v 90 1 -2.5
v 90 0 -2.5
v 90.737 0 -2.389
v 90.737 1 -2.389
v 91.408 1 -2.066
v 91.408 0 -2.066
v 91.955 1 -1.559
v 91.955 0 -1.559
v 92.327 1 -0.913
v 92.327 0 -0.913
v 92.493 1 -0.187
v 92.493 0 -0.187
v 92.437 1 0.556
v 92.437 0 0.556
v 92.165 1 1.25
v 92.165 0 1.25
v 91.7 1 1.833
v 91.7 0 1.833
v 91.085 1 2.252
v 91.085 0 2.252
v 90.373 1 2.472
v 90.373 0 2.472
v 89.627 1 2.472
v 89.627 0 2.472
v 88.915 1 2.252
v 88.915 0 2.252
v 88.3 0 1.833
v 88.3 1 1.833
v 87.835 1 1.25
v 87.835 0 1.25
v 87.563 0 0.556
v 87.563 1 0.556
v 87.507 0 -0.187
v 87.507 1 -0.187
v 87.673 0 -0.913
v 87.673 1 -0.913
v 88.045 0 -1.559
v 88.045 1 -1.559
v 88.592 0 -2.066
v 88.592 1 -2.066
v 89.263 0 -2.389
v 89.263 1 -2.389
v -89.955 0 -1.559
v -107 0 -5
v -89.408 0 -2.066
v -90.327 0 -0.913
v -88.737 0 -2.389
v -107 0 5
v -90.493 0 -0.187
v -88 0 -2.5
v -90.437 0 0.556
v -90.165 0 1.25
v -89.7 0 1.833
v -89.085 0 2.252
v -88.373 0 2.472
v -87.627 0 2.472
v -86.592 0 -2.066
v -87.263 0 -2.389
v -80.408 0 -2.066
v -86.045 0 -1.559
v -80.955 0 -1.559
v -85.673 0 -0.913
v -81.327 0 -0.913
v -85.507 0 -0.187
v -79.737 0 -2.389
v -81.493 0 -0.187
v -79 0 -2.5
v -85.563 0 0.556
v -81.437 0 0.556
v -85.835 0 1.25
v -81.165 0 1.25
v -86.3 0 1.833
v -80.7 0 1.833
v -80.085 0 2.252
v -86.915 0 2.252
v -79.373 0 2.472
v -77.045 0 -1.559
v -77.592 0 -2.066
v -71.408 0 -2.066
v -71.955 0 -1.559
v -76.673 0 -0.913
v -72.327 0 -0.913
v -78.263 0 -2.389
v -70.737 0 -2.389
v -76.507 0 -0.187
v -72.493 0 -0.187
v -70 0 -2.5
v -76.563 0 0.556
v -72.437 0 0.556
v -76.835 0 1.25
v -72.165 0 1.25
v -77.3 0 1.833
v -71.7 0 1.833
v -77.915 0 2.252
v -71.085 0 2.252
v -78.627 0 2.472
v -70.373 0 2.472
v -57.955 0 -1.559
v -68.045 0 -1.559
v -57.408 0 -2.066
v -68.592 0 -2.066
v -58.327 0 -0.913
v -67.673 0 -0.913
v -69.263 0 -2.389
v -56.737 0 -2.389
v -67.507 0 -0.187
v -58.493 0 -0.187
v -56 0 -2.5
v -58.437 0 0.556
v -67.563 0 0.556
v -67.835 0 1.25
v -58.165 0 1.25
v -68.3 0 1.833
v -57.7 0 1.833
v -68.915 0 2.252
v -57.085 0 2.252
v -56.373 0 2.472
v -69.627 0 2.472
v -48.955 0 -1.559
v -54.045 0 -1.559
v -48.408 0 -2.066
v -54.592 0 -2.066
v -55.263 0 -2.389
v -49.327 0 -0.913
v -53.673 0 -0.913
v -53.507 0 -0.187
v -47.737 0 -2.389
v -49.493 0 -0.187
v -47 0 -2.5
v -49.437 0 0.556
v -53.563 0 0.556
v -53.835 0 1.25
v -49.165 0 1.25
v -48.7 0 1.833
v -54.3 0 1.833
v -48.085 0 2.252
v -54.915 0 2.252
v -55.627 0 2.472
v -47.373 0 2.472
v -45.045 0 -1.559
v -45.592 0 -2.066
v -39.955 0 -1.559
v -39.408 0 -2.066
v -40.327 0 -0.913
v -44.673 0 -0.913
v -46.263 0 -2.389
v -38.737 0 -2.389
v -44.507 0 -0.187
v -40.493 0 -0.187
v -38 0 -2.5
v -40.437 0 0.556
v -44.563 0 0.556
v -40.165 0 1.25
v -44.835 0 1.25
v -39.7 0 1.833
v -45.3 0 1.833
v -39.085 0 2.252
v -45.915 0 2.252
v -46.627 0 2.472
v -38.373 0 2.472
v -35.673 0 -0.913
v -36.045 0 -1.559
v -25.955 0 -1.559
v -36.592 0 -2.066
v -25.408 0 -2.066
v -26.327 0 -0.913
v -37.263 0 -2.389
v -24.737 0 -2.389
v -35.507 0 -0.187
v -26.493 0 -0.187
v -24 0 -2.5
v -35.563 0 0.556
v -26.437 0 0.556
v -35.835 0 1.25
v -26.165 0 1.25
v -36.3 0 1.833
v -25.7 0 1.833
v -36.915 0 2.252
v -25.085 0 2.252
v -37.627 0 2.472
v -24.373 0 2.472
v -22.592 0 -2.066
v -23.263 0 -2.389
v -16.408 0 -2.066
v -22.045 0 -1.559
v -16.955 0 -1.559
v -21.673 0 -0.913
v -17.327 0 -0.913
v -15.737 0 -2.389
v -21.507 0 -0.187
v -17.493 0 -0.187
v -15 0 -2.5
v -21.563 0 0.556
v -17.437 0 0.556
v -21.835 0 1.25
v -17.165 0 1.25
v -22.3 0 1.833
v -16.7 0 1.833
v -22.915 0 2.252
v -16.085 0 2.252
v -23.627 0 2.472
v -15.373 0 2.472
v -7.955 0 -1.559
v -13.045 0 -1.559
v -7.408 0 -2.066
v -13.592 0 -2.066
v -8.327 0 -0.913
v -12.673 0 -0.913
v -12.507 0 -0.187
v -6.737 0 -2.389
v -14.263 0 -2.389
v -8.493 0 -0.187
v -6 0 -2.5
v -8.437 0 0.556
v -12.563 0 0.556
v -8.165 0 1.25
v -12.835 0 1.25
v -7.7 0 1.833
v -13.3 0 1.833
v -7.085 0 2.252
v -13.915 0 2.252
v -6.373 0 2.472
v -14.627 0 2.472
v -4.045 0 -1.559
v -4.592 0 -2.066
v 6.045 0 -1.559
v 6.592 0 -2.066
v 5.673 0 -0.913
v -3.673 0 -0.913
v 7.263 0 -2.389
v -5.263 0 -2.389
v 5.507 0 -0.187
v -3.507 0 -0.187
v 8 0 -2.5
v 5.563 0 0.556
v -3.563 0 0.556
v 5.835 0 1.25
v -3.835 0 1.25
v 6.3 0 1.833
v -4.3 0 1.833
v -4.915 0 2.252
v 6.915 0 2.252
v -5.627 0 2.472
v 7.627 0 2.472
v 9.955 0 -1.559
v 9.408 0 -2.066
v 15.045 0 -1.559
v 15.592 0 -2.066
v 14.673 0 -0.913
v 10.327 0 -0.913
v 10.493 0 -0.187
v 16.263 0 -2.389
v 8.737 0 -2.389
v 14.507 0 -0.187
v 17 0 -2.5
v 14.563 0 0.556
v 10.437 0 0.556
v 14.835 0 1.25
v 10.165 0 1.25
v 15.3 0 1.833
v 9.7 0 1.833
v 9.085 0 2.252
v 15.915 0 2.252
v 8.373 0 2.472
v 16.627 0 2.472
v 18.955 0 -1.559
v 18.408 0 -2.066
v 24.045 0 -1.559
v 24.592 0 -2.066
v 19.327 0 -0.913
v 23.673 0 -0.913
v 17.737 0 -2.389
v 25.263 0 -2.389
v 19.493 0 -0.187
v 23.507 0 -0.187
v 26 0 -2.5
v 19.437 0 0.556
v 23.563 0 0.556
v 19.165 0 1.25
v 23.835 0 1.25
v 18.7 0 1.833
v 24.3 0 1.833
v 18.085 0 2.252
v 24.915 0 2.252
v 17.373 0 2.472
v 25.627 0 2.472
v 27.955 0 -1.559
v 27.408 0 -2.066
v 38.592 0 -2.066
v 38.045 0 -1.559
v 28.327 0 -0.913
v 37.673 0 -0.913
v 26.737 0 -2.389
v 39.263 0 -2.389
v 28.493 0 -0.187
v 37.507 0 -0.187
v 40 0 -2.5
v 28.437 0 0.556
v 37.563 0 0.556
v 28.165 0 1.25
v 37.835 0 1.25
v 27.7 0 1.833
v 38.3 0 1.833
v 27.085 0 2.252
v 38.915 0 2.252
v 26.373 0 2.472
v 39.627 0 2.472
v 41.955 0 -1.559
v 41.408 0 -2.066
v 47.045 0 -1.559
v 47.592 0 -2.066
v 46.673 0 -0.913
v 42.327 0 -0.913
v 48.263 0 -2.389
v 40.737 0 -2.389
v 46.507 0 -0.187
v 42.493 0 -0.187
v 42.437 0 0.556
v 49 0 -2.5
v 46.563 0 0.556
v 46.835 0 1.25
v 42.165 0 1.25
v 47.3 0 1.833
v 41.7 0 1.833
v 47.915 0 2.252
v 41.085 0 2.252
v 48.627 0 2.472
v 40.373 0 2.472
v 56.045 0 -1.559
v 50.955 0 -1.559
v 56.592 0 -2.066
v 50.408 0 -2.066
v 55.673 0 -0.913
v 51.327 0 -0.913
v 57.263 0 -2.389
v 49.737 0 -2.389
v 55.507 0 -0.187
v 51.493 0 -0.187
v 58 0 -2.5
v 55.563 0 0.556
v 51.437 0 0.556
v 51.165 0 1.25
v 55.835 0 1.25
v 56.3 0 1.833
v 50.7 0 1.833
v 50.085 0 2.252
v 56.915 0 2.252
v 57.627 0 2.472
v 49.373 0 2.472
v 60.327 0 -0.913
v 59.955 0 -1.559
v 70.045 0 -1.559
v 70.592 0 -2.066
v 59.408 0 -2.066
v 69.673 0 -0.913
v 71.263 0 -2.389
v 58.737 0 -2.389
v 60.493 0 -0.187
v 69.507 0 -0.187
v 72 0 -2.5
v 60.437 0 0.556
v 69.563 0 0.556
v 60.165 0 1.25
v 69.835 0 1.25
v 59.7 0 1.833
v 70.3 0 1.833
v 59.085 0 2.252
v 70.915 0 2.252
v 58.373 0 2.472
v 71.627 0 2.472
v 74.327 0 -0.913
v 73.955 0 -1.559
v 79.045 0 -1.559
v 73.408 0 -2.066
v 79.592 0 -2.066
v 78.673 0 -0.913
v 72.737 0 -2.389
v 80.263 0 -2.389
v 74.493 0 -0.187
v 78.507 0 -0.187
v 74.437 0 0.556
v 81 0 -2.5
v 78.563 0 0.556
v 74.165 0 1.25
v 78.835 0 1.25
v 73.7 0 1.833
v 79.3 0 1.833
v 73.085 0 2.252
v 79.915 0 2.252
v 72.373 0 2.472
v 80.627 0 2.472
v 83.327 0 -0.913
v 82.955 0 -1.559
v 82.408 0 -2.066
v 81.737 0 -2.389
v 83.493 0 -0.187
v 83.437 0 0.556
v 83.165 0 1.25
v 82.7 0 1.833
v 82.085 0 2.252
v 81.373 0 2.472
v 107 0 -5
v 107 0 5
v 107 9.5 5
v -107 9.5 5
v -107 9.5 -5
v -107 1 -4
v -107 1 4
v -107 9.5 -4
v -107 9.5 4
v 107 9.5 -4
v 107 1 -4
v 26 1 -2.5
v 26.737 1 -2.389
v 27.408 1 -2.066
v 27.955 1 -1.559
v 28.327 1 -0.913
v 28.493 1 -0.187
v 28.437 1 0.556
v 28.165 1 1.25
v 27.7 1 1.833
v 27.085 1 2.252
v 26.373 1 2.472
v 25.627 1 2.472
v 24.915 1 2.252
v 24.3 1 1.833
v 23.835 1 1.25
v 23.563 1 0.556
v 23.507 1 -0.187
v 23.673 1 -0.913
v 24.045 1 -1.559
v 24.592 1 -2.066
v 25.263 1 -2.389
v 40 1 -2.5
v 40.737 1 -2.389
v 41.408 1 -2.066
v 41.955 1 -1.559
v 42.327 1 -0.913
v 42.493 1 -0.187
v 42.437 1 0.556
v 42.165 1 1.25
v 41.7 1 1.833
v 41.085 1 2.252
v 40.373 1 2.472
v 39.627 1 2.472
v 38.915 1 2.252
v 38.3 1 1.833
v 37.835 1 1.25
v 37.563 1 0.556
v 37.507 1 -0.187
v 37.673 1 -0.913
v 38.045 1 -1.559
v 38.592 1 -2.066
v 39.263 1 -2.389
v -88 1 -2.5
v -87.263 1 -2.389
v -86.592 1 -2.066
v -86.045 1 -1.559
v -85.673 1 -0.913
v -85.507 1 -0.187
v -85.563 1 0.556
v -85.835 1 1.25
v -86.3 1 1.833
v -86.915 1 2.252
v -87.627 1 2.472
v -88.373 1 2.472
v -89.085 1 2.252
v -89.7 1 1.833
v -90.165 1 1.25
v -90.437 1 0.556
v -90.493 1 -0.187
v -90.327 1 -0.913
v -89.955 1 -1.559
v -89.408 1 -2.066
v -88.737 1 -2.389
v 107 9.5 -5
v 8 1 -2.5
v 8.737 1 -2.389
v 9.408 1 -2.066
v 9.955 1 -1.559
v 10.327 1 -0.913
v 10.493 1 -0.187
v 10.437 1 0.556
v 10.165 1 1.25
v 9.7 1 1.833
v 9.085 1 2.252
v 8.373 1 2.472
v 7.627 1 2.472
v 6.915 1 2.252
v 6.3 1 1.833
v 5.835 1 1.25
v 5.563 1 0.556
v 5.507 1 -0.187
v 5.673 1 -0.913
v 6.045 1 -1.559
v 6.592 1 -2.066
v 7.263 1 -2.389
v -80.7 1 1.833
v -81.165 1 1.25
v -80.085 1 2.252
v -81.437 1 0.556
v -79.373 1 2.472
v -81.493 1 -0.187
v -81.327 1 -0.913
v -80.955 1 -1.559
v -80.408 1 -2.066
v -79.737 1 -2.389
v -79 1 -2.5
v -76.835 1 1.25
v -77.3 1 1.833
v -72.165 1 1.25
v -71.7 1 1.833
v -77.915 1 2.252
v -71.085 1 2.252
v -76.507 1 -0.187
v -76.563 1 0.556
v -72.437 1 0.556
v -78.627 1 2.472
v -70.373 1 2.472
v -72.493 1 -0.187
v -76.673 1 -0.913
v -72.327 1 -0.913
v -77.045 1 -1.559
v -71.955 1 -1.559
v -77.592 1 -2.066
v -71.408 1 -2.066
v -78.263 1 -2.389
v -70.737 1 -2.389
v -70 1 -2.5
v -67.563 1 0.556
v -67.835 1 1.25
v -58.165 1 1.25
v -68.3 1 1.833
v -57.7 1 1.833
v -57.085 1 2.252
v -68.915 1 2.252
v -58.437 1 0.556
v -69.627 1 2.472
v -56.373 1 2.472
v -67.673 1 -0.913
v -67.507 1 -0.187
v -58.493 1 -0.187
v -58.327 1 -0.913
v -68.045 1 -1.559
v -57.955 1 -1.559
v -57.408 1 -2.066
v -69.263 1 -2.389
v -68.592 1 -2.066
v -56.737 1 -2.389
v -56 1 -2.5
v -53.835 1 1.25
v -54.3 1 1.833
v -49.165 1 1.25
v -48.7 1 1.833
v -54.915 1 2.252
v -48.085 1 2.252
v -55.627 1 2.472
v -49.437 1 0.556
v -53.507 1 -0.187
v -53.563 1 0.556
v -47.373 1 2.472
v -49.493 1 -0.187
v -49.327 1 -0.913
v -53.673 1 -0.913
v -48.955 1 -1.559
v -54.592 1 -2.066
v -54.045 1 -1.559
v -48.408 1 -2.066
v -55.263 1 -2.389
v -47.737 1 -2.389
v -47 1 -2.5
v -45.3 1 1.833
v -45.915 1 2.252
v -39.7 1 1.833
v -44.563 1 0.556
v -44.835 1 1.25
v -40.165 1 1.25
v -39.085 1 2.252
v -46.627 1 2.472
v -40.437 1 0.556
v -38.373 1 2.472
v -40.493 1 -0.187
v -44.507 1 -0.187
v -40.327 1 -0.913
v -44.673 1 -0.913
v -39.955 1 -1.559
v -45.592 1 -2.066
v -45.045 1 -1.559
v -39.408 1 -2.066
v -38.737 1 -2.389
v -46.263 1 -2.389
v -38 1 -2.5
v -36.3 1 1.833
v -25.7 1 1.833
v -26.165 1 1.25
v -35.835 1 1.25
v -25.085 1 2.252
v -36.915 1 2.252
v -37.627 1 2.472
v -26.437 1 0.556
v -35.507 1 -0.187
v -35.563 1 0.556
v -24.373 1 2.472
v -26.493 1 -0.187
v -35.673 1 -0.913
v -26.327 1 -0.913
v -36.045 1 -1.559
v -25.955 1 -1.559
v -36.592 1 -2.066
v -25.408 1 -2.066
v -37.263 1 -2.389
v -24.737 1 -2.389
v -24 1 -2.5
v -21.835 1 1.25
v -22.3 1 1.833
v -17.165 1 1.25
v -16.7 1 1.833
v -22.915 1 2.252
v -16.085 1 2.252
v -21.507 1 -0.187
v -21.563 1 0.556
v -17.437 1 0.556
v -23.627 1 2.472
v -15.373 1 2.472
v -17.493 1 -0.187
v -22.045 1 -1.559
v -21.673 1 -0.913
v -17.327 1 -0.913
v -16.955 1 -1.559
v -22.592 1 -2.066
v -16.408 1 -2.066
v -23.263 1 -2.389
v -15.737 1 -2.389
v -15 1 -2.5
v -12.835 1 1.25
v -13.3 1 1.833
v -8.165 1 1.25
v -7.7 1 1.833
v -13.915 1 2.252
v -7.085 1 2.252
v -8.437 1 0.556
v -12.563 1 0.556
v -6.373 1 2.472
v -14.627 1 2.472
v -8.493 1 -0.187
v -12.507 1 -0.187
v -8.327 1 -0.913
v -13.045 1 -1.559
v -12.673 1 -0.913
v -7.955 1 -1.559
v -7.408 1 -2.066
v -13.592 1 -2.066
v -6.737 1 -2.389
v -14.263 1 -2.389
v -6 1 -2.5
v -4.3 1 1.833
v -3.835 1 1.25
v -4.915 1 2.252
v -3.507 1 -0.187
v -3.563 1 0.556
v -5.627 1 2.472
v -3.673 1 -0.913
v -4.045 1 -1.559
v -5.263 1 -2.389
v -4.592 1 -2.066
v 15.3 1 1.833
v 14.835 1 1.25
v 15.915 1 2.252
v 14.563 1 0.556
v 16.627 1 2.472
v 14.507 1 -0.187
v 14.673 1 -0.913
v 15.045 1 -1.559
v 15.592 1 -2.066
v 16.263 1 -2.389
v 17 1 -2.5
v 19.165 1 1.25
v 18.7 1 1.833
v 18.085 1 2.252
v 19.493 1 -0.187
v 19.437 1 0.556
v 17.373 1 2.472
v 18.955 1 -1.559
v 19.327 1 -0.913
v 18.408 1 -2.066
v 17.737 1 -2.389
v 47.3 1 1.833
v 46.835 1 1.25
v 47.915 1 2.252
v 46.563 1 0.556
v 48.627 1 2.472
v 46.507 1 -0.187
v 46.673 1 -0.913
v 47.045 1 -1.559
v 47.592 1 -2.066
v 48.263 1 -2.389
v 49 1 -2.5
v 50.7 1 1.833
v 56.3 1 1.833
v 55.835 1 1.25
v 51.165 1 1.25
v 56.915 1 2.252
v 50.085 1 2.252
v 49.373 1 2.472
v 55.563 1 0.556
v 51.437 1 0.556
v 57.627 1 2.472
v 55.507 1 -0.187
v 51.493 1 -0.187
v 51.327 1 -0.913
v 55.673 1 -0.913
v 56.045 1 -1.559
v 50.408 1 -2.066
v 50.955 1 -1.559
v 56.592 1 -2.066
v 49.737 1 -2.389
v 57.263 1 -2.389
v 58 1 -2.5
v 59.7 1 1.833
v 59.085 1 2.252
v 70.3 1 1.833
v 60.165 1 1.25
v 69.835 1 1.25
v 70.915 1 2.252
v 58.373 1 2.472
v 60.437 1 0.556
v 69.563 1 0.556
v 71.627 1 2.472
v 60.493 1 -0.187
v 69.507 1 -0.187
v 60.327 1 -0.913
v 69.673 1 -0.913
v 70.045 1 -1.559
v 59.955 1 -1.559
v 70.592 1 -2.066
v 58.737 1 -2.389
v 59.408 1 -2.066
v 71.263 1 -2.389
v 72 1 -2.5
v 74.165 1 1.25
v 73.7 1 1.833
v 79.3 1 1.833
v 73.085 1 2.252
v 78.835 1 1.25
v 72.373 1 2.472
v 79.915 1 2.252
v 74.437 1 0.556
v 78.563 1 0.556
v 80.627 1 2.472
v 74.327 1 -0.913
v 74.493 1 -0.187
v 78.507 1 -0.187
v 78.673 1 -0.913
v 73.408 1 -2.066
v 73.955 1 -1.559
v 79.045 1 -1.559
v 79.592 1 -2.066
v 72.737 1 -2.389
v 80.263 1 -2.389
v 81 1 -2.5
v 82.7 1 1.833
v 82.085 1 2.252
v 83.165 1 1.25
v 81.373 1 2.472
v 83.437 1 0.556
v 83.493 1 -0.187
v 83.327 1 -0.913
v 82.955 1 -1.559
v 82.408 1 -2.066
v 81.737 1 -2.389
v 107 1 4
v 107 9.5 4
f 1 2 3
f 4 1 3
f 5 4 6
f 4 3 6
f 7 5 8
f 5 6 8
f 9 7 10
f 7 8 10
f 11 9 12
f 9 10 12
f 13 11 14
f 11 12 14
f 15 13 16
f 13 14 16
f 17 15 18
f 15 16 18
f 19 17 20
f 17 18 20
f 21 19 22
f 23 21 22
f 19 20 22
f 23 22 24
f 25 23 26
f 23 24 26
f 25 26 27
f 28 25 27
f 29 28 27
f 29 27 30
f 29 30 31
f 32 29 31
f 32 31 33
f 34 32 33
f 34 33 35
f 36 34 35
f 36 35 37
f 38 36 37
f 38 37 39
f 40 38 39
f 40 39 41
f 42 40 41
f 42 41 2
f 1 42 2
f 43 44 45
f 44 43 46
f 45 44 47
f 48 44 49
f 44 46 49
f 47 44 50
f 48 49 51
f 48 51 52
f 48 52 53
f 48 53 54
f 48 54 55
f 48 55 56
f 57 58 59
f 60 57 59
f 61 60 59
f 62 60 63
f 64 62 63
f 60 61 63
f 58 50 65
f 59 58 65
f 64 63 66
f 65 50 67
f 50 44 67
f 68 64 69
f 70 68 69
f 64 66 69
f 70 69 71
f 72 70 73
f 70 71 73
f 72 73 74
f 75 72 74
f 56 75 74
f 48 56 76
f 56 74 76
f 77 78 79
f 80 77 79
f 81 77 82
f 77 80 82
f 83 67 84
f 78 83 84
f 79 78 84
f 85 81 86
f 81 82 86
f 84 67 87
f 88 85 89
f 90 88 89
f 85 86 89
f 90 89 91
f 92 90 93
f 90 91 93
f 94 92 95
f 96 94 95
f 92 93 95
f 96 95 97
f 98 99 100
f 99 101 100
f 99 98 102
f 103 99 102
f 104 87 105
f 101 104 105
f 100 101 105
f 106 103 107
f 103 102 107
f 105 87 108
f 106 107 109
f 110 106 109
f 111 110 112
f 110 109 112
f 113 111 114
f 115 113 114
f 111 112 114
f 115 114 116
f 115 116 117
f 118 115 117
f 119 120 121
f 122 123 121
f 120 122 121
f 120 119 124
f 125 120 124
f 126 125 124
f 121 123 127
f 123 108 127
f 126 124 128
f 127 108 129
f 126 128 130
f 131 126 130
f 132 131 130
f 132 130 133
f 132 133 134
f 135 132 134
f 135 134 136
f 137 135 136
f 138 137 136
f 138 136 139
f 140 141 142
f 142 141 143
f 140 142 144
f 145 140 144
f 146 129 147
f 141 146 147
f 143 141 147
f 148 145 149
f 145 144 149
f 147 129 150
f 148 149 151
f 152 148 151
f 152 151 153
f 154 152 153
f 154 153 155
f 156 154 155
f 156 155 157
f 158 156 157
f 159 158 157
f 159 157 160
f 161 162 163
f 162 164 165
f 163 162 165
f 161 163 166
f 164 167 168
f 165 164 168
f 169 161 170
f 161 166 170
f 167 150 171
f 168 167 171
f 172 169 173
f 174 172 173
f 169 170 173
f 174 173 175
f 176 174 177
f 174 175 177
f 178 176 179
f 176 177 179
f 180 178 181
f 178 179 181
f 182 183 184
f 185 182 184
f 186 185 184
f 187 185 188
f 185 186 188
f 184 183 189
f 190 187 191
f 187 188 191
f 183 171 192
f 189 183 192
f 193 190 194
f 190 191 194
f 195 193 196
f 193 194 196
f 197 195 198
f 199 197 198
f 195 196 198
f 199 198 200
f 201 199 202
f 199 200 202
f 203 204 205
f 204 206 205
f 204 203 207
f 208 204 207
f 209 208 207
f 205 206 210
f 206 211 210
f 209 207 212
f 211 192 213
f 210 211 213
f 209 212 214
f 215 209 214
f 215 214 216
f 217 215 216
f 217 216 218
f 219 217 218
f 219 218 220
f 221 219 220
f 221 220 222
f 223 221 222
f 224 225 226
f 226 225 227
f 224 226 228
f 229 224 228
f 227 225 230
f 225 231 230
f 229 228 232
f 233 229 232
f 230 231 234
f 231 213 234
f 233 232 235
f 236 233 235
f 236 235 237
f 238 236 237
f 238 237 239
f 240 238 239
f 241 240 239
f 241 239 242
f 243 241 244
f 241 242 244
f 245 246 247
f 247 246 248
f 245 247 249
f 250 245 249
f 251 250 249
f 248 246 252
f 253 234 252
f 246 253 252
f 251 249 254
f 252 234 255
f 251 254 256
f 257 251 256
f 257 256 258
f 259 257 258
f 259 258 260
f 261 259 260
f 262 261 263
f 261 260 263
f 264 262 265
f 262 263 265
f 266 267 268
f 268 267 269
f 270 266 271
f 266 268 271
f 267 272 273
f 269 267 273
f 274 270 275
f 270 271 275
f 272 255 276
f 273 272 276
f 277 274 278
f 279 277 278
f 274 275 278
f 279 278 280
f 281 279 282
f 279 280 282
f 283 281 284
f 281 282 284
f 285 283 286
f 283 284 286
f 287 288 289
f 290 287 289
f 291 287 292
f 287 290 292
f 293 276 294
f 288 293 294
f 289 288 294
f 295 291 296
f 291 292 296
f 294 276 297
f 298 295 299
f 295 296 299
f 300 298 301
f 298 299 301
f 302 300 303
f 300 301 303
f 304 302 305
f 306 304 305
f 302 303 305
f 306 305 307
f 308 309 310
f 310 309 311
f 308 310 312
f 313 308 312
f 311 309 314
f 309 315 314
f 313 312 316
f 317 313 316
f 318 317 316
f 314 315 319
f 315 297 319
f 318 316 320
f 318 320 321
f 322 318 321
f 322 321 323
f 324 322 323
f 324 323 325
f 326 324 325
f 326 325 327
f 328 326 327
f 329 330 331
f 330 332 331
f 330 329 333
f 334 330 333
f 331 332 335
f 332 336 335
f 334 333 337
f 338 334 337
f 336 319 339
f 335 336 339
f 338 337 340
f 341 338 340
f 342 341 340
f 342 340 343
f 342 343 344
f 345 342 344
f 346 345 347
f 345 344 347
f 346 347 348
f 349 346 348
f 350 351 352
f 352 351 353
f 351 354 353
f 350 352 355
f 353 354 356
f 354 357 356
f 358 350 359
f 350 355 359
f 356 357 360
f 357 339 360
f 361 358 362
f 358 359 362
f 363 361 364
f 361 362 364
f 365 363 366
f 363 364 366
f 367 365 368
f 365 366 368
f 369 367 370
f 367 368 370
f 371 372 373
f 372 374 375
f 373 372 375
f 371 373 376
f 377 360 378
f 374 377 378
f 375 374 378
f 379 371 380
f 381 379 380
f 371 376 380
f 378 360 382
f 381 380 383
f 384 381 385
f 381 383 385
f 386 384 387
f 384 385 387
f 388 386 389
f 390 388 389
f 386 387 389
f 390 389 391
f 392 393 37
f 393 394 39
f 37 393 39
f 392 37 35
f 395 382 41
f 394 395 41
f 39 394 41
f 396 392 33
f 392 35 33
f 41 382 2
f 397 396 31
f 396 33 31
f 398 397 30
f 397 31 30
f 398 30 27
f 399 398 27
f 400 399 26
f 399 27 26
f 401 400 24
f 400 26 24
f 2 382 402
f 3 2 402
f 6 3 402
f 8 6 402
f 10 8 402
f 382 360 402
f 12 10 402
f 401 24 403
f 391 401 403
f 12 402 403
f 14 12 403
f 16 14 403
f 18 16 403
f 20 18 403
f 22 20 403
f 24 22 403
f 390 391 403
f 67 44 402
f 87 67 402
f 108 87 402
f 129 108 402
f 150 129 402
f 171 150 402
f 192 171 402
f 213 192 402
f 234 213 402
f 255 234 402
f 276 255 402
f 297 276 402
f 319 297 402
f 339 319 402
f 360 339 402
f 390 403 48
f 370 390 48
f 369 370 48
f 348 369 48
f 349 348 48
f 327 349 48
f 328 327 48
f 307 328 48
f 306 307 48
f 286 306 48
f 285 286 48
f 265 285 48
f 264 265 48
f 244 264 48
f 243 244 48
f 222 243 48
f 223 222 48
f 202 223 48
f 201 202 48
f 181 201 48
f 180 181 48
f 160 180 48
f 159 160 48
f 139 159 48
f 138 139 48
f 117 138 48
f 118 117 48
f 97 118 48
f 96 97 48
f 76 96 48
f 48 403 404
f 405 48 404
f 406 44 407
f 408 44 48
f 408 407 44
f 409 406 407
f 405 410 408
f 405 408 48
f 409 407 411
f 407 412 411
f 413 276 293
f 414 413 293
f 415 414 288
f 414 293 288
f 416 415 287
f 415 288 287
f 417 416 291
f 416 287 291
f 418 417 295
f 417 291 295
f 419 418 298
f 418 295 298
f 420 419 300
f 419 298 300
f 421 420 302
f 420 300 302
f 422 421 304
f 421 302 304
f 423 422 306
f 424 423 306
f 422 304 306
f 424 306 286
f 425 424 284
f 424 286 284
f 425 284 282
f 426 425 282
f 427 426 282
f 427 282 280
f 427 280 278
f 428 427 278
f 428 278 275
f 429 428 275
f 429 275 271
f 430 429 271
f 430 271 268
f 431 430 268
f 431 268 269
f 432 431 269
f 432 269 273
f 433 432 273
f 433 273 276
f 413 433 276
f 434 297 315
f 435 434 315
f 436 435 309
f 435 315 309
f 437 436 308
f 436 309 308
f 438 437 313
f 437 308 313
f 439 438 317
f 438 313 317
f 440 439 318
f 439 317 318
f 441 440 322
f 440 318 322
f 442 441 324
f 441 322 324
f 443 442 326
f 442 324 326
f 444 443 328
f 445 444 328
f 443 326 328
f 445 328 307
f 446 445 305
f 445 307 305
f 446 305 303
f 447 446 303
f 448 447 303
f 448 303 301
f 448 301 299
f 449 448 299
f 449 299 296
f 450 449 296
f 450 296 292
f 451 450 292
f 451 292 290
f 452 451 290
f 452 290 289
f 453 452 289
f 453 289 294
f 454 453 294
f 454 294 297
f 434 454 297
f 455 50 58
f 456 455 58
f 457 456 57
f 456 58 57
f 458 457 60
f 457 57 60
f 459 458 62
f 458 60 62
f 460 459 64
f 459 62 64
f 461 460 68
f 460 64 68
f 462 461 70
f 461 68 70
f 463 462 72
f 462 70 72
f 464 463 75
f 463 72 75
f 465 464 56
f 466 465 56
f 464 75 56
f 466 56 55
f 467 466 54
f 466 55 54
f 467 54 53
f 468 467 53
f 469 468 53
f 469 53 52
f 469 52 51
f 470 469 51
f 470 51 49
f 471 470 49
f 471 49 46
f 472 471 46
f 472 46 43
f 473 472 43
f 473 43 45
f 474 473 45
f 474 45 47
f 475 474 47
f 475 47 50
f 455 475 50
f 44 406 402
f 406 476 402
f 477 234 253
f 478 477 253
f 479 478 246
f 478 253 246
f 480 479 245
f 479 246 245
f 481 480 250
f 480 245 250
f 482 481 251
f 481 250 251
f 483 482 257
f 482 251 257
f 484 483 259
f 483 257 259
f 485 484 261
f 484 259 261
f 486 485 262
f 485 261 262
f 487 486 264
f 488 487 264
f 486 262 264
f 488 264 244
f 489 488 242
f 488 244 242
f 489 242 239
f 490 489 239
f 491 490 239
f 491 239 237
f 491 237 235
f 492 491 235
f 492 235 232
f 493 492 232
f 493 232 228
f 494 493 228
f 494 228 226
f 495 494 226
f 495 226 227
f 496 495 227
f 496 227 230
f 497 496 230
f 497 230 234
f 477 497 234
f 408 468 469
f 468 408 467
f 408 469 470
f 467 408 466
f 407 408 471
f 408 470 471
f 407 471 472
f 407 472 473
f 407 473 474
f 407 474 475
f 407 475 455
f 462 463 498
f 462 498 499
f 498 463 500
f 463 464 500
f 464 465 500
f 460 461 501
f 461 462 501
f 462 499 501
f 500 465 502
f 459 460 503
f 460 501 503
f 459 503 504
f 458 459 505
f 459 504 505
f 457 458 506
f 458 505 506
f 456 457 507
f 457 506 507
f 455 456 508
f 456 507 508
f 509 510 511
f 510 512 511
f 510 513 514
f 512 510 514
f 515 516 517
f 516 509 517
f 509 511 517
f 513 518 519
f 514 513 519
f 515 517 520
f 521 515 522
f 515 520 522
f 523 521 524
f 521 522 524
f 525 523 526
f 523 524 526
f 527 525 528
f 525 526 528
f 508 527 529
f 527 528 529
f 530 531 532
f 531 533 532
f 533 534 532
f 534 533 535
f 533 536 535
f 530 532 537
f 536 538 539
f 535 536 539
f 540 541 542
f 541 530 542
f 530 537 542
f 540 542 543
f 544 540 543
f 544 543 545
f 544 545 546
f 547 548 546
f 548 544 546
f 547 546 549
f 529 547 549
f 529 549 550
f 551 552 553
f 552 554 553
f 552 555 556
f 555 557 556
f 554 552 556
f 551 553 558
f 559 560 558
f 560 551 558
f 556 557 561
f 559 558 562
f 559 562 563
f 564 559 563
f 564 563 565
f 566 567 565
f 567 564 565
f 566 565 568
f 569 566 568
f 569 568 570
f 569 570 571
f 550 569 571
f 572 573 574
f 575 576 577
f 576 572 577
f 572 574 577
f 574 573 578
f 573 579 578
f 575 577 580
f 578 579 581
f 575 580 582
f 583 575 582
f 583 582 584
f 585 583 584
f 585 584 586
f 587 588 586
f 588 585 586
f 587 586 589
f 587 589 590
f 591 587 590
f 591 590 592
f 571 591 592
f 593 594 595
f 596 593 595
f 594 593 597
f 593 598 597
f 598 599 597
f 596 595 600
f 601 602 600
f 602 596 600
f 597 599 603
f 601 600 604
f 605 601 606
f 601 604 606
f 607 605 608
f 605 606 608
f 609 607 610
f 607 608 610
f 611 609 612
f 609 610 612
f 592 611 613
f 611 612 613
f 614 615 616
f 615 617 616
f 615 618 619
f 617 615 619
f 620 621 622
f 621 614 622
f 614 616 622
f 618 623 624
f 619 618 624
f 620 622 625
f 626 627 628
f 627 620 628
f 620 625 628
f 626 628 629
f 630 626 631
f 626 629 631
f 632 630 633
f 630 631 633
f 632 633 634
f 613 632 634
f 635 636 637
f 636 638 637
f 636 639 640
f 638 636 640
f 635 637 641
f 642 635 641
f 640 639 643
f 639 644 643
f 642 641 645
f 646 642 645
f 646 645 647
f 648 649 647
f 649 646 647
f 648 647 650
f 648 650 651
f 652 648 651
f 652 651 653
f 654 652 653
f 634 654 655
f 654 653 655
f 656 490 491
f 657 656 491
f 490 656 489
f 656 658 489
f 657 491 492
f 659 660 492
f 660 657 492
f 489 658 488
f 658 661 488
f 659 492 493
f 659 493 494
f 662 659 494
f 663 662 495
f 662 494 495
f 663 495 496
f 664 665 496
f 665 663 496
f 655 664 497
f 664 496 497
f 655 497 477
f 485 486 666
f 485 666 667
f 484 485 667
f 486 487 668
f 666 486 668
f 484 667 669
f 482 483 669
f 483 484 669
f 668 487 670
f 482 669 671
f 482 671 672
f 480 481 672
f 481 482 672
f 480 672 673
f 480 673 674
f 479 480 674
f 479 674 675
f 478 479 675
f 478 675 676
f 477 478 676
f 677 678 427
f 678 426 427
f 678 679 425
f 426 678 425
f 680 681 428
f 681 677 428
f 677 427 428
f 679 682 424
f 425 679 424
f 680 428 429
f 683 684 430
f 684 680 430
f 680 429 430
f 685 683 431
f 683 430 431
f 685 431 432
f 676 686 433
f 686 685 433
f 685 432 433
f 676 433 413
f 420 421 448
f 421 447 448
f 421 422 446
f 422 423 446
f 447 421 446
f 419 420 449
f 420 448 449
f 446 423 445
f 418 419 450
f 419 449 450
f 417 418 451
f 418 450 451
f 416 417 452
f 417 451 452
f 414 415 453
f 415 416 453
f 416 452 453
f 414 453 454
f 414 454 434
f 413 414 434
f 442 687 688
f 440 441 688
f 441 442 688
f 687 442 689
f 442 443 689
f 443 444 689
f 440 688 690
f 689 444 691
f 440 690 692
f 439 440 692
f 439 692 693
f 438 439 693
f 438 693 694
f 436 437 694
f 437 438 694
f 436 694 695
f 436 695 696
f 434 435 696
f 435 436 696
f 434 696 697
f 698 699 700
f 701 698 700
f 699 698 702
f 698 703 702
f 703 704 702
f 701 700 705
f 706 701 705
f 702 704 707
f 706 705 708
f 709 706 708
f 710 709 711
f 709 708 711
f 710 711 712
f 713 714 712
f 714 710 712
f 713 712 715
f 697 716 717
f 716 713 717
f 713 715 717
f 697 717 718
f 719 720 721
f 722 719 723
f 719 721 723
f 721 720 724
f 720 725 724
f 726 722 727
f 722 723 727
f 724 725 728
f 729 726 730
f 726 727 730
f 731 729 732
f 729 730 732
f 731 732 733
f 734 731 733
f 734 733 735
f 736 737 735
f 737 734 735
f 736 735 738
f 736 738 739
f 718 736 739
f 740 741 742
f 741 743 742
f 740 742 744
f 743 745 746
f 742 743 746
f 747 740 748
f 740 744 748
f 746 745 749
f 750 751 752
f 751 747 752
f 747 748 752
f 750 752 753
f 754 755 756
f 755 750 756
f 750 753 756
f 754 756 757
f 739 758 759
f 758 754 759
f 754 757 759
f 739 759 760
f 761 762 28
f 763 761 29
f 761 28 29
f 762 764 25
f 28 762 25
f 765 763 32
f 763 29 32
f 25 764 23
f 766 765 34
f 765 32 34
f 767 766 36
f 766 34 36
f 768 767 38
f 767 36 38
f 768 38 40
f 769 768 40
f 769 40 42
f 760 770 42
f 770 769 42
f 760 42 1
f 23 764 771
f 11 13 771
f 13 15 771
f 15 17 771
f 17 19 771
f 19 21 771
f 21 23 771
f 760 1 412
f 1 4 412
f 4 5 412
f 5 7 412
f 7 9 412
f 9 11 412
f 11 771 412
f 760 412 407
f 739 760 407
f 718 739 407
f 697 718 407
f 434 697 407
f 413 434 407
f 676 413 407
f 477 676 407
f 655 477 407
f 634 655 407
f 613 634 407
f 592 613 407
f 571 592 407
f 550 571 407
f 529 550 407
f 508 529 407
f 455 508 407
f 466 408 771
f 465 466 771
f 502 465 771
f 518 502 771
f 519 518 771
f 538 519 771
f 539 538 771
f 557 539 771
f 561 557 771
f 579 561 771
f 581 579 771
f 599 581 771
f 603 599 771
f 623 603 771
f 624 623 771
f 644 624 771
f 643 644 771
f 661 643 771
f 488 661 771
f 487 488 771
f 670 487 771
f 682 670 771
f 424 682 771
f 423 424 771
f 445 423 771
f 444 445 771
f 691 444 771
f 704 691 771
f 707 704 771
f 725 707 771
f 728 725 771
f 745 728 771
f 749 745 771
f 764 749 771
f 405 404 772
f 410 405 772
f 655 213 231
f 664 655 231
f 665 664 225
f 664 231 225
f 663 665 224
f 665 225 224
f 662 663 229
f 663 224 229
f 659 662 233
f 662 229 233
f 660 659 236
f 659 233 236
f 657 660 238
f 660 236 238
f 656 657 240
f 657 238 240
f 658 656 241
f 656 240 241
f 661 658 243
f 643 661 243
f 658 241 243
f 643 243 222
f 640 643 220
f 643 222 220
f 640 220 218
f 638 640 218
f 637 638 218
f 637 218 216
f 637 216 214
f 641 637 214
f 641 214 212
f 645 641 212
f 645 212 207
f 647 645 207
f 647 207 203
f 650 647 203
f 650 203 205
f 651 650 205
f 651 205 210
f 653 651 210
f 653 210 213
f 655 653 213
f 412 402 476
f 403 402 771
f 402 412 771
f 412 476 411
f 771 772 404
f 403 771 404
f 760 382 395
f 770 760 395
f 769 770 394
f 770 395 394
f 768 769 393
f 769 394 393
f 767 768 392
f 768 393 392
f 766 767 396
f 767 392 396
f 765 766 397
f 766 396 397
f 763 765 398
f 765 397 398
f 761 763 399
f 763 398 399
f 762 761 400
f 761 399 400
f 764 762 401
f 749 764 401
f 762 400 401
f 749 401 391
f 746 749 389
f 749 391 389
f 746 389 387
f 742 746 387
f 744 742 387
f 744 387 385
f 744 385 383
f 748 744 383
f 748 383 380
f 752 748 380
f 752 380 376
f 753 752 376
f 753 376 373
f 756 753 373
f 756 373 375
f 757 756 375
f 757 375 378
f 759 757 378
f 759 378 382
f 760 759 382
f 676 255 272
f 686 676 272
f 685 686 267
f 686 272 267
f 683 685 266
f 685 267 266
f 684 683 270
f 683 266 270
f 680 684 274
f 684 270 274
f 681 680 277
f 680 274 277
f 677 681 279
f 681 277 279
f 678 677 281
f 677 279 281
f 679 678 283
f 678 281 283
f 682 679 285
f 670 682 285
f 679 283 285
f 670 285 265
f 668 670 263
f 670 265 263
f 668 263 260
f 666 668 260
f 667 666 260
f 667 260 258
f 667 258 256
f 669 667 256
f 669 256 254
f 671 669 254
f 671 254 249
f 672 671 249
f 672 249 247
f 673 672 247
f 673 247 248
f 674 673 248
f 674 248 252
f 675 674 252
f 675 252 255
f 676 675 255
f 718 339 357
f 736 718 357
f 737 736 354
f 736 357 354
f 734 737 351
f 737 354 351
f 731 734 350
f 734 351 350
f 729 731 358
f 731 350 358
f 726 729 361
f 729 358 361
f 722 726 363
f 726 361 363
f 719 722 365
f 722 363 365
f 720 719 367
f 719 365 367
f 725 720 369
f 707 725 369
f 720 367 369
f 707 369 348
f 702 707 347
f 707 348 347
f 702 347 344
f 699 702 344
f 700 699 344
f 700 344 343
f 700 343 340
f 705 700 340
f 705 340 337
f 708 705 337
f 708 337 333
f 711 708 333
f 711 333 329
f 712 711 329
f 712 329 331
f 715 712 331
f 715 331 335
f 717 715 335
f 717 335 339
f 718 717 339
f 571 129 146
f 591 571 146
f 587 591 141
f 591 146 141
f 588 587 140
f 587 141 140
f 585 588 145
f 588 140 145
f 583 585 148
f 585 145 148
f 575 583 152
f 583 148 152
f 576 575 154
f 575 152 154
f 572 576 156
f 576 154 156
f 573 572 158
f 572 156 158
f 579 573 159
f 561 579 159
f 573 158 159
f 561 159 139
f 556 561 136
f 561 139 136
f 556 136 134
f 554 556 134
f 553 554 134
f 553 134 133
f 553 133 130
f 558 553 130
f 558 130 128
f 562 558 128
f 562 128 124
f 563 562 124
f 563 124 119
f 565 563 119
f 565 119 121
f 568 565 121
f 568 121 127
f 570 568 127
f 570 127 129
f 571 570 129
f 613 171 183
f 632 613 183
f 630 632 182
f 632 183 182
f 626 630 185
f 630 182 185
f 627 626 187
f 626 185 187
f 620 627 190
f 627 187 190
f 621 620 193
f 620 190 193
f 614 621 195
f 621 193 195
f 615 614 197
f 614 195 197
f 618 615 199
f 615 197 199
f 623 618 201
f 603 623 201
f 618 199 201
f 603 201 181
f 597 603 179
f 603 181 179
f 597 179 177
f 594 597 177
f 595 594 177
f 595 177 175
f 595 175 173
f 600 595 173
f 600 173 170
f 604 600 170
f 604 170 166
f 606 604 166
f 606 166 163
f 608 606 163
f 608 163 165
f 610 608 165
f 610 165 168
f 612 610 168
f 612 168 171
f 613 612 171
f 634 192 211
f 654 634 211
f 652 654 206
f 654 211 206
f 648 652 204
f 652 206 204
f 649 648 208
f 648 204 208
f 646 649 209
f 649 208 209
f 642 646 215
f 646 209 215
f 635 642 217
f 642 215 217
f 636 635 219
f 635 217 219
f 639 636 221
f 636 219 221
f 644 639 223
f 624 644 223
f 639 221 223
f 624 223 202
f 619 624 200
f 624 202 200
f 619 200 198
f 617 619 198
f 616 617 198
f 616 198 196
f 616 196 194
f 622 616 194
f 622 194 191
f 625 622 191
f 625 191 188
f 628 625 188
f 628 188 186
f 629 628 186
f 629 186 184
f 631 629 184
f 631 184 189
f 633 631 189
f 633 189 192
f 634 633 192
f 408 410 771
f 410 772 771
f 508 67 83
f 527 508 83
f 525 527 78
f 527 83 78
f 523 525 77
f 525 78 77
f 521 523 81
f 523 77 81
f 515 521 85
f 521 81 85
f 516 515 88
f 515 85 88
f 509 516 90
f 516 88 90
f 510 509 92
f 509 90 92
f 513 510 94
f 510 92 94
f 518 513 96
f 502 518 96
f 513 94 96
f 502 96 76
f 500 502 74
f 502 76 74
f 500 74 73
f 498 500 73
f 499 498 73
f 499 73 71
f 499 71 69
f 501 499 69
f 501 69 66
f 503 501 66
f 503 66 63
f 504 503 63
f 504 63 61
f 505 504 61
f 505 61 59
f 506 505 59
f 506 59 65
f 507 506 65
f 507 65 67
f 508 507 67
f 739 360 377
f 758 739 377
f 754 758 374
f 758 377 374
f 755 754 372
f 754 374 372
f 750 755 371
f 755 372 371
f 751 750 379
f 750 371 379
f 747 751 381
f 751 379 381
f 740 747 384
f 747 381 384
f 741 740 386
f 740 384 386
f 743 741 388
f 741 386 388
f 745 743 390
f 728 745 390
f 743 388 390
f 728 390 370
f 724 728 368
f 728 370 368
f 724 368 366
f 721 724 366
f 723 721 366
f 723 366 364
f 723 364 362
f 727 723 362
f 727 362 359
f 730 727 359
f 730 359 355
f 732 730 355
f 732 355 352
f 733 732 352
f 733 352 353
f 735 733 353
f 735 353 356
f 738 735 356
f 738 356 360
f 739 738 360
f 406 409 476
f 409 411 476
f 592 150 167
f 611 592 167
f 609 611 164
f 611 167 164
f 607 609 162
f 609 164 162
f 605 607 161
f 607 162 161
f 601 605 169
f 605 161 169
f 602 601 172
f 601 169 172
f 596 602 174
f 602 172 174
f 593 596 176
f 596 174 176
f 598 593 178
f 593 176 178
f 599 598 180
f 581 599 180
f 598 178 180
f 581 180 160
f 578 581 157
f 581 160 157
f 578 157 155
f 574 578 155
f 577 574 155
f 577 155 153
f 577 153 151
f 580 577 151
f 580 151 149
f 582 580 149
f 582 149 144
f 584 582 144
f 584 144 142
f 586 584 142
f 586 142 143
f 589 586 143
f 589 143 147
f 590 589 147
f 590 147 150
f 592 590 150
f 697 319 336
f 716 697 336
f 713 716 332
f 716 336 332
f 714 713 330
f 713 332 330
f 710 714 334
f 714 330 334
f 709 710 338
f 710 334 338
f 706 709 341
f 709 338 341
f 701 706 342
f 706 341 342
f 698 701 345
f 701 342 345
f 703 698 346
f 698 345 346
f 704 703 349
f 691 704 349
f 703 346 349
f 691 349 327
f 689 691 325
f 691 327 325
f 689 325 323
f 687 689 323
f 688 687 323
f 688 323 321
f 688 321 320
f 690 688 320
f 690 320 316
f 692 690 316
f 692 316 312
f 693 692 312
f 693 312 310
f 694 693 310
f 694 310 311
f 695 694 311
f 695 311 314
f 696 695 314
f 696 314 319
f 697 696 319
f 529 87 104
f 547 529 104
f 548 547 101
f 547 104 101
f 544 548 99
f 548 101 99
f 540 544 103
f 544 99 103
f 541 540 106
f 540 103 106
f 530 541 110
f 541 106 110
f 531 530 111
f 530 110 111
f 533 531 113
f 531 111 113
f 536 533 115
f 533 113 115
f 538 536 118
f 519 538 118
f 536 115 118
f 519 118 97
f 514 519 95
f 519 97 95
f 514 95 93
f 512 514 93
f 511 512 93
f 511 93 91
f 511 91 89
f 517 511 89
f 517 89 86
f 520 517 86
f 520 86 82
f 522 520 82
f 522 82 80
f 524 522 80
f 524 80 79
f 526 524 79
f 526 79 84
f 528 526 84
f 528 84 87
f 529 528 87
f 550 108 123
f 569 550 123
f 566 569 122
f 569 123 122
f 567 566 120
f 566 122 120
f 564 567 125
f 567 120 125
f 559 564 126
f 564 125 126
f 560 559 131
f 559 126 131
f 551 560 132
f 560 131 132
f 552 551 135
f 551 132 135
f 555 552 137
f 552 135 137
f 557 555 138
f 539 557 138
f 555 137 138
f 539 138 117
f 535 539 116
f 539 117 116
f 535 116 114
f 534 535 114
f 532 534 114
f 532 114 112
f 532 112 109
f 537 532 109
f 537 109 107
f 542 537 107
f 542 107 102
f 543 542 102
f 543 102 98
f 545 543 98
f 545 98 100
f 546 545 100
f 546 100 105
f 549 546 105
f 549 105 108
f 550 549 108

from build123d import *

# Parameters (mm, degrees)
BOSS_EXTRU_1_DEPTH      = 107
ESQUISSE2_R             = 2.5
ENL_V_MAT_EXTRU_1_DEPTH = 108.537202865


with BuildPart() as part:
    # Esquisse1 → Boss.-Extru.1 (new, symmetric)
    with BuildSketch(Plane(origin=(0, 0, 0), x_dir=(0, 0, -1), z_dir=(1, 0, 0))):
        Polygon((-5, 9.5), (-4, 9.5), (-4, 1), (4, 1), (4, 9.5), (5, 9.5), (5, 0), (-5, 0), align=None)
    extrude(amount=BOSS_EXTRU_1_DEPTH, both=True)

    # Esquisse2 → Enlèv. mat.-Extru.1 (cut, through all)
    with BuildSketch(Plane.XZ):
        with Locations(Location((-88, 0, 0), (0, 0, 270))):
            Circle(ESQUISSE2_R)
        with Locations(Location((-79, 0, 0), (0, 0, 270))):
            Circle(ESQUISSE2_R)
        with Locations(Location((-70, 0, 0), (0, 0, 270))):
            Circle(ESQUISSE2_R)
        with Locations(Location((-56, 0, 0), (0, 0, 270))):
            Circle(ESQUISSE2_R)
        with Locations(Location((-47, 0, 0), (0, 0, 270))):
            Circle(ESQUISSE2_R)
        with Locations(Location((-38, 0, 0), (0, 0, 270))):
            Circle(ESQUISSE2_R)
        with Locations(Location((-24, 0, 0), (0, 0, 270))):
            Circle(ESQUISSE2_R)
        with Locations(Location((-15, 0, 0), (0, 0, 270))):
            Circle(ESQUISSE2_R)
        with Locations(Location((-6, 0, 0), (0, 0, 270))):
            Circle(ESQUISSE2_R)
        with Locations(Location((8, 0, 0), (0, 0, 270))):
            Circle(ESQUISSE2_R)
        with Locations(Location((17, 0, 0), (0, 0, 270))):
            Circle(ESQUISSE2_R)
        with Locations(Location((26, 0, 0), (0, 0, 270))):
            Circle(ESQUISSE2_R)
        with Locations(Location((40, 0, 0), (0, 0, 270))):
            Circle(ESQUISSE2_R)
        with Locations(Location((49, 0, 0), (0, 0, 270))):
            Circle(ESQUISSE2_R)
        with Locations(Location((58, 0, 0), (0, 0, 270))):
            Circle(ESQUISSE2_R)
        with Locations(Location((72, 0, 0), (0, 0, 270))):
            Circle(ESQUISSE2_R)
        with Locations(Location((81, 0, 0), (0, 0, 270))):
            Circle(ESQUISSE2_R)
        with Locations(Location((90, 0, 0), (0, 0, 270))):
            Circle(ESQUISSE2_R)
    extrude(amount=-ENL_V_MAT_EXTRU_1_DEPTH, mode=Mode.SUBTRACT)


solid = part.part
